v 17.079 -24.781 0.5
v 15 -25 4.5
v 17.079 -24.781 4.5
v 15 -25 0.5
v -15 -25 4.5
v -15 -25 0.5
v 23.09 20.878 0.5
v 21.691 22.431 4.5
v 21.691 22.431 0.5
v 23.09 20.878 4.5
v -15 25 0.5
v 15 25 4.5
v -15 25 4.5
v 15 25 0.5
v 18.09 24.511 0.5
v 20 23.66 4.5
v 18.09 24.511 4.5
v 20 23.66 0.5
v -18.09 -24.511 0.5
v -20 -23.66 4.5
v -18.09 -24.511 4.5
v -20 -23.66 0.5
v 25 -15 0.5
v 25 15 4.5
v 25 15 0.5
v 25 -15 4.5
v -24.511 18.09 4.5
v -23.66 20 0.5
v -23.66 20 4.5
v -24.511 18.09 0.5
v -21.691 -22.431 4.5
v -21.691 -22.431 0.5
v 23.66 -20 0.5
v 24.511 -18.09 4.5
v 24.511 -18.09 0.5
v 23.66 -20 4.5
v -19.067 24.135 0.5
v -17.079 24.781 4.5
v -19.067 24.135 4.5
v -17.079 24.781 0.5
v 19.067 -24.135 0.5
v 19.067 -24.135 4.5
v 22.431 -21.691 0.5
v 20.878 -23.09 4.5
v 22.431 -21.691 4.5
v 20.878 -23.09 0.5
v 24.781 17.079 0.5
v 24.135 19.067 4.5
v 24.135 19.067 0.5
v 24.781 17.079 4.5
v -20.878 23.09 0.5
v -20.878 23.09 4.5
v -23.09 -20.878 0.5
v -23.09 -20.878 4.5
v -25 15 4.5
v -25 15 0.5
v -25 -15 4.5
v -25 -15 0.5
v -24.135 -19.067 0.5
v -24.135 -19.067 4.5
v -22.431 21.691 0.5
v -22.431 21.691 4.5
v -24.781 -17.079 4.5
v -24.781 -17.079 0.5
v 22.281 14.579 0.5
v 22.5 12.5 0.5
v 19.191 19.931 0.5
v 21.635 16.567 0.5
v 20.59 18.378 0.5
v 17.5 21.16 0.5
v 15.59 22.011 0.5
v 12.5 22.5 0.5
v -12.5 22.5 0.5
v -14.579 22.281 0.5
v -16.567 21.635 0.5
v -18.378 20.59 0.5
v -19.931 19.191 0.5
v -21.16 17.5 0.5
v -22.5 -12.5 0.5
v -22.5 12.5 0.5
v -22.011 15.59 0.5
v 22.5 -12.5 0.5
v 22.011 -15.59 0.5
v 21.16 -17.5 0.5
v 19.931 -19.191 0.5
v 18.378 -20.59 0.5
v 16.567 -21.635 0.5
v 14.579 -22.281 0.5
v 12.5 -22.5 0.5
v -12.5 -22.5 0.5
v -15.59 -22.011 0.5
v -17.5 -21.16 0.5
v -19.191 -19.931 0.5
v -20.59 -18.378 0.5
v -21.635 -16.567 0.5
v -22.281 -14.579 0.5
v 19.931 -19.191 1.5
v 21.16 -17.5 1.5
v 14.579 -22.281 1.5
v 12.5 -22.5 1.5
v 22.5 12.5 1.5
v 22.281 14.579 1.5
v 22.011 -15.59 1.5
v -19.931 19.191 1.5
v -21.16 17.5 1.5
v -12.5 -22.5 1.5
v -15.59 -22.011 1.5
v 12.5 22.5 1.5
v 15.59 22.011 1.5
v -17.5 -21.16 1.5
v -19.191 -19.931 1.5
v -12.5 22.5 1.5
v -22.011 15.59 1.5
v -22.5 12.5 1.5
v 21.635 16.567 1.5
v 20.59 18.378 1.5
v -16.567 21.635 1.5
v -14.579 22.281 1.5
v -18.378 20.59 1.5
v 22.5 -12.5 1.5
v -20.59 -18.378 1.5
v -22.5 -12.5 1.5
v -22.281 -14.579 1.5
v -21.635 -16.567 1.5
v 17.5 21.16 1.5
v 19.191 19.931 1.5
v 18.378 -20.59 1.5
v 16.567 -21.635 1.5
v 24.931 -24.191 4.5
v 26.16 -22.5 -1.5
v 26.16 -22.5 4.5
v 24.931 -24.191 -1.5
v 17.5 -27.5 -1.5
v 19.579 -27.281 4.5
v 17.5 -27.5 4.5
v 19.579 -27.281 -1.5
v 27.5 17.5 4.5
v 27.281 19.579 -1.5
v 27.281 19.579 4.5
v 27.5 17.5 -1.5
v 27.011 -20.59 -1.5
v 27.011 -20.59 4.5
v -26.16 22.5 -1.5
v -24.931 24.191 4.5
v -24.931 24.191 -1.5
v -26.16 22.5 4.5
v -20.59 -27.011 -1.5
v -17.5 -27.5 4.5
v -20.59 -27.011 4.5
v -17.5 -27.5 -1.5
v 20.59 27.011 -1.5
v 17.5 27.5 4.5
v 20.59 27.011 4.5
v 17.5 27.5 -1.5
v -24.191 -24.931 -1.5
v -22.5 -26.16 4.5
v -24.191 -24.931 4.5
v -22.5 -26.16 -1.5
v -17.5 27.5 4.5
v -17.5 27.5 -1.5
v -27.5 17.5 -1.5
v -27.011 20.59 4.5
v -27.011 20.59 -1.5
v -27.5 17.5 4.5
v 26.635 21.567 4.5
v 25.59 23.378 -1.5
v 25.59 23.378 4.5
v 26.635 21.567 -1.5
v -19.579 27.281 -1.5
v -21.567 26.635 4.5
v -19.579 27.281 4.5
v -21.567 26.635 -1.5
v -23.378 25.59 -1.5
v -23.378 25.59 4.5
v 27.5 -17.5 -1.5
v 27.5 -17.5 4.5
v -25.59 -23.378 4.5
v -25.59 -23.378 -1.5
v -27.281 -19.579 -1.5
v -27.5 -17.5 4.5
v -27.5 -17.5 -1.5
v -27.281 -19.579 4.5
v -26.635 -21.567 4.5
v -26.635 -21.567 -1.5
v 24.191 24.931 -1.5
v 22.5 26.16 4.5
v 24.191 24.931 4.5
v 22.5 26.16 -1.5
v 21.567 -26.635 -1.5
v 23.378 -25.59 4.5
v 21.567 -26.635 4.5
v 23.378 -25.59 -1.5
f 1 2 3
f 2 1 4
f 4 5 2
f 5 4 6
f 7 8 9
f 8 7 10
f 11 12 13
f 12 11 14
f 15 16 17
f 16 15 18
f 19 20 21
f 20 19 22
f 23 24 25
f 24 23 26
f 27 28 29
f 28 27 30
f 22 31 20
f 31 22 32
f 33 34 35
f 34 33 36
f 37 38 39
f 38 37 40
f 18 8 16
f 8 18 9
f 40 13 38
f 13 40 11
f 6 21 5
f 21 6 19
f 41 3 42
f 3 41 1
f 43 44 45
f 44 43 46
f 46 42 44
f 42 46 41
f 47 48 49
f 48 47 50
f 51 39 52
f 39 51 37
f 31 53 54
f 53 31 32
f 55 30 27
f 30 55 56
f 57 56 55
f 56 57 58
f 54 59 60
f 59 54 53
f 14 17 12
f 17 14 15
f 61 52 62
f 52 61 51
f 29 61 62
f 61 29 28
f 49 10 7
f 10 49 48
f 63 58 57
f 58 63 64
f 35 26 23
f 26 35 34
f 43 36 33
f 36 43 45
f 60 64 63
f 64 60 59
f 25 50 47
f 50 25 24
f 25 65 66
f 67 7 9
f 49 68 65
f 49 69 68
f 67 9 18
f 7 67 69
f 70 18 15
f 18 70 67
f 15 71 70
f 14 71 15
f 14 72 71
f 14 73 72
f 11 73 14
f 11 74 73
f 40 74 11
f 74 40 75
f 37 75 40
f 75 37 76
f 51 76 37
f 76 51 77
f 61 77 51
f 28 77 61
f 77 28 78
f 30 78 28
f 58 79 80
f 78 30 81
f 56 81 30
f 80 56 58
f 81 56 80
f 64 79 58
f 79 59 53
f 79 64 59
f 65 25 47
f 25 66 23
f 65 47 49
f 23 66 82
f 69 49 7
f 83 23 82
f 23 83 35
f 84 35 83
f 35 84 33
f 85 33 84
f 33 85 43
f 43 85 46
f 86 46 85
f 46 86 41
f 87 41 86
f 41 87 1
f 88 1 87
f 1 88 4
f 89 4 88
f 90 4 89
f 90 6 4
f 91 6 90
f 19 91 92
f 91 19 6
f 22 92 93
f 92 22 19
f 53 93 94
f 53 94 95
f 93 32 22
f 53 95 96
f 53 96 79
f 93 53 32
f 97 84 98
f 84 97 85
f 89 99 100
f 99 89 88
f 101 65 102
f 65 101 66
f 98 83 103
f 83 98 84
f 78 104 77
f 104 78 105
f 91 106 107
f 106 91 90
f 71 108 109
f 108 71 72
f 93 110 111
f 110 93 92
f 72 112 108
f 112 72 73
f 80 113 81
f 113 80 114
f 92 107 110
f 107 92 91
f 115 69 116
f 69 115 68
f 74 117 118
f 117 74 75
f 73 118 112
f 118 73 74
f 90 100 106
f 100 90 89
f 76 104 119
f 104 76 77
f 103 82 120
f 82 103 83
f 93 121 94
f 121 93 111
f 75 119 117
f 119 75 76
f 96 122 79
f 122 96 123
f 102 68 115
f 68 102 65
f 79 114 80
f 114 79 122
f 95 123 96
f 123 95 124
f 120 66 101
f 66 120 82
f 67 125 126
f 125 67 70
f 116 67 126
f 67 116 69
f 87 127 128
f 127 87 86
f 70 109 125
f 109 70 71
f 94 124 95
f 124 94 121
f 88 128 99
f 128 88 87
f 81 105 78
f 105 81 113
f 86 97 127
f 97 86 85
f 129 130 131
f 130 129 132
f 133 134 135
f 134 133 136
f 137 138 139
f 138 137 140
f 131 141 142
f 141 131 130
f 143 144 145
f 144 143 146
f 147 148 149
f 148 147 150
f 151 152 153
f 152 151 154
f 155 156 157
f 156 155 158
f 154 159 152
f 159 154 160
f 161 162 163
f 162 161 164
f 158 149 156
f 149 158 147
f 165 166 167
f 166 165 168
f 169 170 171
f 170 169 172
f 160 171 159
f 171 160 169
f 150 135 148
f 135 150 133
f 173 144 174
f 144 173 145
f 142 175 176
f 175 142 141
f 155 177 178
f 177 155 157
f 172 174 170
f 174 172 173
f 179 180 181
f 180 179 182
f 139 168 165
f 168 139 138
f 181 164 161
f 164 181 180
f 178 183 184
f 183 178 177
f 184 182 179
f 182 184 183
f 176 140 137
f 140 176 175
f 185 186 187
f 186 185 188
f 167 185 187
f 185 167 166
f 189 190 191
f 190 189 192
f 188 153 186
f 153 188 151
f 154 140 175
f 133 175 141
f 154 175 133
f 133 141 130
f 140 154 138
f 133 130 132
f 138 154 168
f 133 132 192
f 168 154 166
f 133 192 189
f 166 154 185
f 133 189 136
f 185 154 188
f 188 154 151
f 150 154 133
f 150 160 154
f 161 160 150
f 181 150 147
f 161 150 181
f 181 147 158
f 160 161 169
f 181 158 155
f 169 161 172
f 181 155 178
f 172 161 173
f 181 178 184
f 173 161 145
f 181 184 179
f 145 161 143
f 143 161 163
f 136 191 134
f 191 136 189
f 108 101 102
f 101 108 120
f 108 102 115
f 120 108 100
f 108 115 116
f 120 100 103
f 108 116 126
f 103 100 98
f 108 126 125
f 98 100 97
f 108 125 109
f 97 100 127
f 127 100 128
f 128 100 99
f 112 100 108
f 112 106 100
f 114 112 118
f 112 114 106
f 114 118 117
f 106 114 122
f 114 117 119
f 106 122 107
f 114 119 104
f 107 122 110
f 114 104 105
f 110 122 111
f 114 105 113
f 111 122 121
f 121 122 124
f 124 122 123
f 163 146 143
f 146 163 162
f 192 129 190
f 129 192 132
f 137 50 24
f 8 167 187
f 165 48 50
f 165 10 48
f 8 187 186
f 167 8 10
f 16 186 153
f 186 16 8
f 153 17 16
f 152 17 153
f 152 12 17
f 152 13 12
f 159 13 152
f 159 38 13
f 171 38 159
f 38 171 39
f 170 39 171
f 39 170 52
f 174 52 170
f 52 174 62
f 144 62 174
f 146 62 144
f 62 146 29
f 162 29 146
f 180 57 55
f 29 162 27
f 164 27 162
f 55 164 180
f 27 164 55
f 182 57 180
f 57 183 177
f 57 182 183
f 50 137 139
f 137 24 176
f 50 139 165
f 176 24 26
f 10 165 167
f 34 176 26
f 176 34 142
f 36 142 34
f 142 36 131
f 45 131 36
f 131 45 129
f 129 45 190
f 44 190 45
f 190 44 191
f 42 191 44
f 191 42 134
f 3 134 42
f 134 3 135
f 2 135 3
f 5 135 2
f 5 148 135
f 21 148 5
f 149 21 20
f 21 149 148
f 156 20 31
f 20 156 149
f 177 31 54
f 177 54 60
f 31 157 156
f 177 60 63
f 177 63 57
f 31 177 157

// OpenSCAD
/*
 * Test for a stamp mold
 */
echo(version=version());

logo = "SC.small.png"; // res 876 x 968, reduced to 200 x 221
logox = 200; 
logoy = 221; 

module roundedRect(size, radius) {  
	linear_extrude(height=size.z, center=true) {
		offset(radius) offset(-radius) {
			square([size.x, size.y], center = true);
		}
	}
}

// Base plate
// ----------
plateWidth = 55;
plateLength = 55;
plateThickNess = 3;
cornerRadius = 10;
color("red") {
difference() {  
	union() {
		difference() {
			roundedRect([plateWidth, plateLength, plateThickNess], cornerRadius);
			translate([0, 0, 2]) {
				scale([.9 * plateWidth / logox, .9 * plateWidth / logoy, .02]) {
					color("white") {
						rotate([0, 0, -90]) {
							surface(file=logo, invert=true, center=true);
						}
					}
				}
        // the groove around the picture
        difference() {
          roundedRect([plateWidth -  5, plateLength -  5, plateThickNess], cornerRadius);
          roundedRect([plateWidth - 10, plateLength - 10, plateThickNess * 1.1], cornerRadius);
        }
			}
		}
		// The frame
		translate([0, 0, (plateThickNess / 1)]) {
			difference() {
				roundedRect([plateWidth, plateLength, plateThickNess], cornerRadius);
				roundedRect([plateWidth - 5, plateLength - 5, plateThickNess * 1.1], cornerRadius);
			}
		}
	}
}
}
